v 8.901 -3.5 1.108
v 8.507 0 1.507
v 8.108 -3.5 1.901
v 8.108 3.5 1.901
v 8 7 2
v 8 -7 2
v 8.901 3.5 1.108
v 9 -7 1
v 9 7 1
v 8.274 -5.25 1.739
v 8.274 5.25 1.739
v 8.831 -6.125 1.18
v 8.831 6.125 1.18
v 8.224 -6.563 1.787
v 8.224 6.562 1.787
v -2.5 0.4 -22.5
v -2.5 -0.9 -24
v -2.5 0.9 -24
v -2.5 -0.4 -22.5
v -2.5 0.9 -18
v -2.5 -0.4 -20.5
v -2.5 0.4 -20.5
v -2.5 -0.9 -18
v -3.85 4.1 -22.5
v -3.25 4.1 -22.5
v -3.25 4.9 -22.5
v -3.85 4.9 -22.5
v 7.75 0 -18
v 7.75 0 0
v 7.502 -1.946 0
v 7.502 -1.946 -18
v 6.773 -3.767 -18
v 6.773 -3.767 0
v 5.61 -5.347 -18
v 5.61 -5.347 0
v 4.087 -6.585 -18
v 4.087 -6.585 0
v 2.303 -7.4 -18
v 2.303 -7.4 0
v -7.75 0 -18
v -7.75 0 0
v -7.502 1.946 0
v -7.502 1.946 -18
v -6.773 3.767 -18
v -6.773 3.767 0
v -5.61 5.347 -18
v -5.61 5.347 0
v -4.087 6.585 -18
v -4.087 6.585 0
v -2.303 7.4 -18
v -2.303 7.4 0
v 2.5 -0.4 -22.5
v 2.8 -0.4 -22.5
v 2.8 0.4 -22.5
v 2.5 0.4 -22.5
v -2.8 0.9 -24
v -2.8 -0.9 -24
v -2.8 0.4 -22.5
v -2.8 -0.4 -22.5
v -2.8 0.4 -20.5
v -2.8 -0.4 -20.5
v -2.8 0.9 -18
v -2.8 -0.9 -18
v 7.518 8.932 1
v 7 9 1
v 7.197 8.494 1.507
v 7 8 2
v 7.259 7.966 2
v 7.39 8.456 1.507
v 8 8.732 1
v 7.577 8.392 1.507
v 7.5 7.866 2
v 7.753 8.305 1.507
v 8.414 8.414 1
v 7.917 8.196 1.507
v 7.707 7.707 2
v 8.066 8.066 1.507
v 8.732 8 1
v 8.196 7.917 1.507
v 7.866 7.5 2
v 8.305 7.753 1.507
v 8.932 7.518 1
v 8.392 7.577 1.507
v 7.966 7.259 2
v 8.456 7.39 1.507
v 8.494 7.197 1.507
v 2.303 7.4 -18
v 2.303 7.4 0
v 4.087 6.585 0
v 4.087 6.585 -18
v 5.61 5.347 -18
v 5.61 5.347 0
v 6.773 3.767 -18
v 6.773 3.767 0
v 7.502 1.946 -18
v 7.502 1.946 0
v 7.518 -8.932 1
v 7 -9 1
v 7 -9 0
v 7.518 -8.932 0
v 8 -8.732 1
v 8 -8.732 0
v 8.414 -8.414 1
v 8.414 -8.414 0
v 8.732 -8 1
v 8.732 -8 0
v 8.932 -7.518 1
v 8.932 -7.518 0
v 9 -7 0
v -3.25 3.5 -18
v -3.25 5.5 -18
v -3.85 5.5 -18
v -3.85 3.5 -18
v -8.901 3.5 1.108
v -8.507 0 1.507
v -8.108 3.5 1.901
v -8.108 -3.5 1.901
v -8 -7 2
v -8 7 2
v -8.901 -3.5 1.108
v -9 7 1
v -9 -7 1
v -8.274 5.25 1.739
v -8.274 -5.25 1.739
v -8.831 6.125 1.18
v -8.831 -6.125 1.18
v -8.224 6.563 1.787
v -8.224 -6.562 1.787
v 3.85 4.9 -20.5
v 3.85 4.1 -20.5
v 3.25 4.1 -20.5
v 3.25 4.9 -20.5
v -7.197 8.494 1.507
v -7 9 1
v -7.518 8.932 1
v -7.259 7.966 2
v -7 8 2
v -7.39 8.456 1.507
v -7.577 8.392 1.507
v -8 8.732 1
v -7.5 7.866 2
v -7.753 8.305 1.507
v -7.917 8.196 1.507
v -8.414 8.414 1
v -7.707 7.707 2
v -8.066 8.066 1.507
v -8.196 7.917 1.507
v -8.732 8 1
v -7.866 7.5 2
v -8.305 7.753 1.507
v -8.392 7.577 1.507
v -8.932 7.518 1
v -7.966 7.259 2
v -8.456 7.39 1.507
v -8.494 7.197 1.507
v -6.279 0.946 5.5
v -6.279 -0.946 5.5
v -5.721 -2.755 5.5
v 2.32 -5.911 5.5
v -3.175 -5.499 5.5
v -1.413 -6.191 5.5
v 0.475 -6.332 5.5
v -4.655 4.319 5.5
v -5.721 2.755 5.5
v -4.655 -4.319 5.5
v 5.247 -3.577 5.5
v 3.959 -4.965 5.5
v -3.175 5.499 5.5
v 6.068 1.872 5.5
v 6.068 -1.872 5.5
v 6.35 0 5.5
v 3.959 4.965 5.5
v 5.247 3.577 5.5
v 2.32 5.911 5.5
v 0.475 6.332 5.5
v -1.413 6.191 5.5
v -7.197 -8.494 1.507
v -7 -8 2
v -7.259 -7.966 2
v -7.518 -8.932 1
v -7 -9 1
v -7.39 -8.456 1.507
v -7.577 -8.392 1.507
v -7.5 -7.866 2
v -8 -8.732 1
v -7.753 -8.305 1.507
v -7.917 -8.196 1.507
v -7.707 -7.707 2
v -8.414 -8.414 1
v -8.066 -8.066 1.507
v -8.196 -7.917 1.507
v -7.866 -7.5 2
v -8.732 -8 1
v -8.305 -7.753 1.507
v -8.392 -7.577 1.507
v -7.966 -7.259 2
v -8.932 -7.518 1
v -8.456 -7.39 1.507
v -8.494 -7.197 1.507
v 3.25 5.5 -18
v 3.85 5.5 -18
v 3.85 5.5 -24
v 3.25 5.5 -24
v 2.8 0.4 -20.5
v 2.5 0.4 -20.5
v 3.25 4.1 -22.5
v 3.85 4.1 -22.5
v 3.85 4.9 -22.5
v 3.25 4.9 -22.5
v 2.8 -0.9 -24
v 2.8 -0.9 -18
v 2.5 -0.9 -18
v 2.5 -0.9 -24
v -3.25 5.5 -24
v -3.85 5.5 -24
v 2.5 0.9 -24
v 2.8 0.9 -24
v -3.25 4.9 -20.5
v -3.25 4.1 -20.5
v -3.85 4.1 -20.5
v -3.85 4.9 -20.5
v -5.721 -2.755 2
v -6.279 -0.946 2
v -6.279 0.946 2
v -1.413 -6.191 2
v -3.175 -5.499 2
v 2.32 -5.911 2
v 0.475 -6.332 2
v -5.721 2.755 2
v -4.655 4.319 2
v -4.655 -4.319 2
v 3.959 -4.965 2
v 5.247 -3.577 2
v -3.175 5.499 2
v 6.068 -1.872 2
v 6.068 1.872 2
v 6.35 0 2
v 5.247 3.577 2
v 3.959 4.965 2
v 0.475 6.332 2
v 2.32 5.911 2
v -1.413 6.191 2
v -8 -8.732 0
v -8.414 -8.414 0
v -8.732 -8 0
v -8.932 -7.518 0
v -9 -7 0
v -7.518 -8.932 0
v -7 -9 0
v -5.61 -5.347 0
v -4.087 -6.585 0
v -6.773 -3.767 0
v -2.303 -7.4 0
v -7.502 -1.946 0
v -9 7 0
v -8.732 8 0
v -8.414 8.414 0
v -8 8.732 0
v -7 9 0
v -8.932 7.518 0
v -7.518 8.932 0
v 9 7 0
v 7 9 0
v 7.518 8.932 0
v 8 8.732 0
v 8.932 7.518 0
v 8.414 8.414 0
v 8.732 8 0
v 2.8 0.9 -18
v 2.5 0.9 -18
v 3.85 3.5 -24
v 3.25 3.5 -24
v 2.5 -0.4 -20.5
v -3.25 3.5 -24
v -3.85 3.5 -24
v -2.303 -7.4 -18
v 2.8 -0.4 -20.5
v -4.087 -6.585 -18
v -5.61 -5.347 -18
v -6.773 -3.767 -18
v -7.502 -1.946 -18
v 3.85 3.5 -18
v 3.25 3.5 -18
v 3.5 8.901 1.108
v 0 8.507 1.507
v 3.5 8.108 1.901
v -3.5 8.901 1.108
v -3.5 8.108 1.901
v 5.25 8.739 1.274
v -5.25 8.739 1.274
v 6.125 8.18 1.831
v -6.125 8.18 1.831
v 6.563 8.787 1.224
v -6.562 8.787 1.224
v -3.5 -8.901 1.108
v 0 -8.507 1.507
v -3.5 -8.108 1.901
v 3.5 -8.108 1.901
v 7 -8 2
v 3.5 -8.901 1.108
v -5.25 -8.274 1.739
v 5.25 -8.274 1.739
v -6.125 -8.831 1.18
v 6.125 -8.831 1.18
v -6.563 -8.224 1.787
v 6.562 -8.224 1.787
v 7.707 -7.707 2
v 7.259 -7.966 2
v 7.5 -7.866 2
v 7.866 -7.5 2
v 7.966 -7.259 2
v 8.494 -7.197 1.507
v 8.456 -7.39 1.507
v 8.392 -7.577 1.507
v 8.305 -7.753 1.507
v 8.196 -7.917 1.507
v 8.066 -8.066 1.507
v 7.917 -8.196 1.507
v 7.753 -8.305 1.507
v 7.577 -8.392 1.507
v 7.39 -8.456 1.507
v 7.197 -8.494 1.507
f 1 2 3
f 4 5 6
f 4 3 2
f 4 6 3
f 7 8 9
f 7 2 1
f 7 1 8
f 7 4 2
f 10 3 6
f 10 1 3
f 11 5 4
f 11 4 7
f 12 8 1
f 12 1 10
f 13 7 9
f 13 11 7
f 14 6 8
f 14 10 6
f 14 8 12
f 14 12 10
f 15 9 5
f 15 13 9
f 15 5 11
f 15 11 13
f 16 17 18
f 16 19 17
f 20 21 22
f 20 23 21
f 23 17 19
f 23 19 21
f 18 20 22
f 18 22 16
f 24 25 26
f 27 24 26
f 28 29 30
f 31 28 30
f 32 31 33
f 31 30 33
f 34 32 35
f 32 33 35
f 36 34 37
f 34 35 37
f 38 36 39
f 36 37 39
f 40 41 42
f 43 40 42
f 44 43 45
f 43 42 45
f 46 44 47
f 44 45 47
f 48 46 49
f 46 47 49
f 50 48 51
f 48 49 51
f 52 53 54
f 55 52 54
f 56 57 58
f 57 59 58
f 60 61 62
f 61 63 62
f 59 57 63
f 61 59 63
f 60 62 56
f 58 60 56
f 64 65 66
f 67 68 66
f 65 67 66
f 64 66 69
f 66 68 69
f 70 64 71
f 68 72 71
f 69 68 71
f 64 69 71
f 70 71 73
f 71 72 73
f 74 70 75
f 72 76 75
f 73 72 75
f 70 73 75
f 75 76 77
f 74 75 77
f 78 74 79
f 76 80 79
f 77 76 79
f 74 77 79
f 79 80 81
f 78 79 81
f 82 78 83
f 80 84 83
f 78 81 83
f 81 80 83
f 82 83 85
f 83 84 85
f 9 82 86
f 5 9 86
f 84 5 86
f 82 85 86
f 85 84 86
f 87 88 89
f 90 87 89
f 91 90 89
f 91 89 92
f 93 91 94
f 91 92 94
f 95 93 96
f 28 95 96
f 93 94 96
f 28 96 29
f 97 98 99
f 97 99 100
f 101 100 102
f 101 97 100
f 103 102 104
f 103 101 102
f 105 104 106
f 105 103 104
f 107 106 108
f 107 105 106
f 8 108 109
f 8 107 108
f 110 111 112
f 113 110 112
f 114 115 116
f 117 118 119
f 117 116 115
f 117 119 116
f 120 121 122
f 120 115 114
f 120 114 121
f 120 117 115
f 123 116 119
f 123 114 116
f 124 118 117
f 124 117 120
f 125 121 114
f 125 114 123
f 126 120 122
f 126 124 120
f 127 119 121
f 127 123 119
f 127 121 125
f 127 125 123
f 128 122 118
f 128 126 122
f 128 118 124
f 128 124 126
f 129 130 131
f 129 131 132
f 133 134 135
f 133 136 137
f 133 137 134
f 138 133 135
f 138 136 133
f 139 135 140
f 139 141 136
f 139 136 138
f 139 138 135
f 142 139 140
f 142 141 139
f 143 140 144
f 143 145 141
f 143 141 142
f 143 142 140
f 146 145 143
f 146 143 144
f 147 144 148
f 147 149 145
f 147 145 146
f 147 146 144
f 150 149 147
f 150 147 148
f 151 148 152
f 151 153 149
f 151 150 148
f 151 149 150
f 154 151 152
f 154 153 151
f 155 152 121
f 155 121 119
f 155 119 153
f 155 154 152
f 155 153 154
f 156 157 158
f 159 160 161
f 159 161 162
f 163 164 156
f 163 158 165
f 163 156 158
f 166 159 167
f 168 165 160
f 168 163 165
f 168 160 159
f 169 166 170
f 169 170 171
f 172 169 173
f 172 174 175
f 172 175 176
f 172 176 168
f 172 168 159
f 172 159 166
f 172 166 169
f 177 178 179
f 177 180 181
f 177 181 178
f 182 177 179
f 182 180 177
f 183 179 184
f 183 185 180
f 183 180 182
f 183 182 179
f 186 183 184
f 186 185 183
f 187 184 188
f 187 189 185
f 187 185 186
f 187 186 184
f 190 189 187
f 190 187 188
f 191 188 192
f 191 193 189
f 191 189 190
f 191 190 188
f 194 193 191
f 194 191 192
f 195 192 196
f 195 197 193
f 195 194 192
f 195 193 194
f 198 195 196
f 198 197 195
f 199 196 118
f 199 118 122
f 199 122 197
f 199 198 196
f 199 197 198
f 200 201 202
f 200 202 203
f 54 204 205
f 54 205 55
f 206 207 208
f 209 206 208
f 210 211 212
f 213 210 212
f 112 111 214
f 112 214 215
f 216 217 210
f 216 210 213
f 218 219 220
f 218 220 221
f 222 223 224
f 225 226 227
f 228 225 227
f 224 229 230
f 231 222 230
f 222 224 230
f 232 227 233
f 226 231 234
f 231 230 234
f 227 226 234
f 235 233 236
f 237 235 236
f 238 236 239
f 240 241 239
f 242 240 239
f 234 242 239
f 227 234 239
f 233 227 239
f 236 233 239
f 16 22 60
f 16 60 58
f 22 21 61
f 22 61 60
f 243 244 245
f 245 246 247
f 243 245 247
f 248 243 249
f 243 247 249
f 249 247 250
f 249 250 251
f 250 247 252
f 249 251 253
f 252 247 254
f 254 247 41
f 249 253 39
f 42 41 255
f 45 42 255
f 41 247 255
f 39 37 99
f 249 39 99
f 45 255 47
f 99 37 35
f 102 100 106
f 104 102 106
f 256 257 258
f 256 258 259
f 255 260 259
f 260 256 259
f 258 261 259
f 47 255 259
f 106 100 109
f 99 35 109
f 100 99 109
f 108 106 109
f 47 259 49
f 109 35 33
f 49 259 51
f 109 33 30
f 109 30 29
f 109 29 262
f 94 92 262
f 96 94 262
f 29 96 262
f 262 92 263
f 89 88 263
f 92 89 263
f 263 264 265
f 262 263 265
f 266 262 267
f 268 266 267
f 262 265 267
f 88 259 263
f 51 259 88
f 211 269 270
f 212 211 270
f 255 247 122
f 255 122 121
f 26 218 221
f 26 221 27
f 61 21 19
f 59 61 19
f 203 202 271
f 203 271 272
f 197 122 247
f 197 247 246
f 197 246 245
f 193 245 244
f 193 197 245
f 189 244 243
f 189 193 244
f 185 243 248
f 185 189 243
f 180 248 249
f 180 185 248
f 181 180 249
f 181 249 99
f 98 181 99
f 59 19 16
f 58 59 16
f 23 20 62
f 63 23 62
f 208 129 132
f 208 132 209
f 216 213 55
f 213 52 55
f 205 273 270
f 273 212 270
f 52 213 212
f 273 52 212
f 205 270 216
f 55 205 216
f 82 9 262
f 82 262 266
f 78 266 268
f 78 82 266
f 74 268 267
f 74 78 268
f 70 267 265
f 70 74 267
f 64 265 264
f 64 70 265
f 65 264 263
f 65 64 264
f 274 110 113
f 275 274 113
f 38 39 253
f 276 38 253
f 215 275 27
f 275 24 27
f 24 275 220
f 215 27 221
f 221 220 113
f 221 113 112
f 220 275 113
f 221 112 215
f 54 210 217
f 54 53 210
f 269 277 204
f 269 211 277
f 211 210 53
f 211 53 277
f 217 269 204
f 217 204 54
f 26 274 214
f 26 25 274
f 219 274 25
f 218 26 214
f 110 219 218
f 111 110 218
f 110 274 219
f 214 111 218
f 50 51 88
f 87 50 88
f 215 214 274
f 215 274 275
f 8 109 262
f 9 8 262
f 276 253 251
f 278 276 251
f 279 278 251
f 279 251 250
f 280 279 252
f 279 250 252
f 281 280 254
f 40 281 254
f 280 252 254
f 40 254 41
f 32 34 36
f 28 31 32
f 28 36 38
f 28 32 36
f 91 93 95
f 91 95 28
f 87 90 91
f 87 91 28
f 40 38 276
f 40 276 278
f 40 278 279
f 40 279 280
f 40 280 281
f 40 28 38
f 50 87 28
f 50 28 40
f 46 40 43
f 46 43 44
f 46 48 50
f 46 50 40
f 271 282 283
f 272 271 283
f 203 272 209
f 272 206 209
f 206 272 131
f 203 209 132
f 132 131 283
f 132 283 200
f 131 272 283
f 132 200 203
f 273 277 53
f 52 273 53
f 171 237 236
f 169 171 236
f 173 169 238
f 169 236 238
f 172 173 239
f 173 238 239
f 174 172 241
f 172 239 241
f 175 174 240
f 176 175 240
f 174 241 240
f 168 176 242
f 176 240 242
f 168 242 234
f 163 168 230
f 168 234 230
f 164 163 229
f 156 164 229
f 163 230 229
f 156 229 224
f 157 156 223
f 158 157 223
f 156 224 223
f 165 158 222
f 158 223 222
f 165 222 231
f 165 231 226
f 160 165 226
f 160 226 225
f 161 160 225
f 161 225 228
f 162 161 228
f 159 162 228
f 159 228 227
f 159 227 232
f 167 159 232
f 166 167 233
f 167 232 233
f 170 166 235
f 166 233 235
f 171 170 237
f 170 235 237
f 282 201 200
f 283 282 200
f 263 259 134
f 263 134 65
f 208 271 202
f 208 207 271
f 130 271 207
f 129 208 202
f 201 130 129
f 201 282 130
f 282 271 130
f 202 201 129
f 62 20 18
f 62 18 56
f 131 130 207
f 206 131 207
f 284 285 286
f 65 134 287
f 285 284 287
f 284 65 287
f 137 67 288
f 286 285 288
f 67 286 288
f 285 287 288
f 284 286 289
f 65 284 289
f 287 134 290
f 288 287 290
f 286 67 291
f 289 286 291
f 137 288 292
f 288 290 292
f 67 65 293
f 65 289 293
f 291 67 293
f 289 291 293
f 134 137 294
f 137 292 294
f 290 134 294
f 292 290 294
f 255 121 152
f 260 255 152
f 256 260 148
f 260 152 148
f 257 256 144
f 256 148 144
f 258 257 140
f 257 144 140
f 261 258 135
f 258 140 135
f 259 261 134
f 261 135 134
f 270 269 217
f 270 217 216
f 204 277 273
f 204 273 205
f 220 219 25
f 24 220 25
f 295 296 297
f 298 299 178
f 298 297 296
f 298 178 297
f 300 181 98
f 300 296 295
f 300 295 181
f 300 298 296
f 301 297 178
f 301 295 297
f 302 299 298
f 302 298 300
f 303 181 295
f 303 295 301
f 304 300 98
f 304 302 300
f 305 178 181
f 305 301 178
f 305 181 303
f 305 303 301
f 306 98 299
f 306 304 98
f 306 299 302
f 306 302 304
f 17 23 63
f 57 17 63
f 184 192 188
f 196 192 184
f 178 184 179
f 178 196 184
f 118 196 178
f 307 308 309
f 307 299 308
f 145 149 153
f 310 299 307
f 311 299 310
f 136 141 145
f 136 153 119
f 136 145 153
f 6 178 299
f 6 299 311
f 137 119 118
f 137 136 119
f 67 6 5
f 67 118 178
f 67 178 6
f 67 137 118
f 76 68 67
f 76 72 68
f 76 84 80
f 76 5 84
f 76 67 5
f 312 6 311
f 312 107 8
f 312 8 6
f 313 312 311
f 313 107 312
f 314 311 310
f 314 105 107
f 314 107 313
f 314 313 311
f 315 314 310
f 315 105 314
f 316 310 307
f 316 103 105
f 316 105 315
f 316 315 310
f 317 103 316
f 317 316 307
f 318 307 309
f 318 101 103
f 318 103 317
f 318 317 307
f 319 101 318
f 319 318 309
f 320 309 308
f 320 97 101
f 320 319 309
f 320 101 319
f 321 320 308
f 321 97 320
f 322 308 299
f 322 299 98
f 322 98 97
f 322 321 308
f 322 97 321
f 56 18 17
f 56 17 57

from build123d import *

# Parameters (mm, degrees)
SKETCH1_W             = 18
SKETCH1_H             = 18
BOSS_EXTRUDE1_DEPTH   = 2
FILLET1_R             = 2
FILLET2_SIZE          = 1
SKETCH2_R             = 6.35
BOSS_EXTRUDE2_DEPTH   = 3.5
BOSS_EXTRUDE3_DEPTH   = 18
SKETCH4_W             = 0.6
SKETCH4_H             = 2
BOSS_EXTRUDE4_DEPTH   = 6
SKETCH4_W_2           = 0.3
SKETCH4_H_2           = 1.8
BOSS_EXTRUDE4_2_DEPTH = 6
BOSS_EXTRUDE4_3_DEPTH = 6
BOSS_EXTRUDE4_4_DEPTH = 6
SKETCH5_W             = 2
SKETCH5_H             = 0.8
CUT_EXTRUDE1_DEPTH    = 29.672678709


with BuildPart() as part:
    # Sketch1 → Boss-Extrude1 (new body)
    with BuildSketch(Plane.XY):
        Rectangle(SKETCH1_W, SKETCH1_H)
    extrude(amount=BOSS_EXTRUDE1_DEPTH)

    # Fillet1
    fillet1_edges = [part.edges().sort_by_distance(p)[0] for p in [
        (9, -9, 1),
        (-9, -9, 1),
        (-9, 9, 1),
        (9, 9, 1),
    ]]
    fillet(fillet1_edges, radius=FILLET1_R)

    # Fillet2
    # a fillet whose section is not a circle: 1 mm, written as the material it takes off along each edge
    with BuildSketch(Plane(origin=(-7, 7, 2), x_dir=(0, 1, 0), z_dir=(1, 0, 0))) as fillet2_piece_1:
        with BuildLine():
            Bezier((2, -FILLET2_SIZE), (2, 0), (2 - FILLET2_SIZE, 0), weights=[1, 0.014142136, 1])
            Line((2 - FILLET2_SIZE, 0), (2, 0))
            Line((2, 0), (2, -FILLET2_SIZE))
        make_face()
    revolve(axis=Axis((-7, 7, 2), (0, 0, 1)), revolution_arc=90, mode=Mode.SUBTRACT)
    with BuildSketch(Plane(origin=(-7, 9, 2), x_dir=(0, 0, -1), z_dir=(1, 0, 0))) as fillet2_piece_2:
        with BuildLine():
            Bezier((FILLET2_SIZE, 0), (0, 0), (0, -FILLET2_SIZE), weights=[1, 0.014142136, 1])
            Line((0, -FILLET2_SIZE), (0, 0))
            Line((0, 0), (FILLET2_SIZE, 0))
        make_face()
    extrude(amount=14, mode=Mode.SUBTRACT)
    with BuildSketch(Plane(origin=(7, 7, 2), x_dir=(0, 1, 0), z_dir=(-1, 0, 0))) as fillet2_piece_3:
        with BuildLine():
            Bezier((2, FILLET2_SIZE), (2, 0), (2 - FILLET2_SIZE, 0), weights=[1, 0.014142136, 1])
            Line((2 - FILLET2_SIZE, 0), (2, 0))
            Line((2, 0), (2, FILLET2_SIZE))
        make_face()
    revolve(axis=Axis((7, 7, 2), (0, 0, -1)), revolution_arc=90, mode=Mode.SUBTRACT)
    with BuildSketch(Plane(origin=(9, 7, 2), x_dir=(-1, 0, 0), z_dir=(0, -1, 0)), Plane(origin=(7, -9, 2), x_dir=(0, 1, 0), z_dir=(-1, 0, 0)), Plane(origin=(-9, -7, 2), x_dir=(1, 0, 0), z_dir=(0, 1, 0))) as fillet2_piece_4:
        with BuildLine():
            Bezier((FILLET2_SIZE, 0), (0, 0), (0, FILLET2_SIZE), weights=[1, 0.014142136, 1])
            Line((0, FILLET2_SIZE), (0, 0))
            Line((0, 0), (FILLET2_SIZE, 0))
        make_face()
    extrude(amount=14, mode=Mode.SUBTRACT)
    with BuildSketch(Plane(origin=(7, -7, 2), x_dir=(1, 0, 0), z_dir=(0, 1, 0))) as fillet2_piece_5:
        with BuildLine():
            Bezier((2 - FILLET2_SIZE, 0), (2, 0), (2, FILLET2_SIZE), weights=[1, 0.014142136, 1])
            Line((2, FILLET2_SIZE), (2, 0))
            Line((2, 0), (2 - FILLET2_SIZE, 0))
        make_face()
    revolve(axis=Axis((7, -7, 2), (0, 0, -1)), revolution_arc=90, mode=Mode.SUBTRACT)
    with BuildSketch(Plane(origin=(-7, -7, 2), x_dir=(0, -1, 0), z_dir=(1, 0, 0))) as fillet2_piece_6:
        with BuildLine():
            Bezier((2 - FILLET2_SIZE, 0), (2, 0), (2, FILLET2_SIZE), weights=[1, 0.014142136, 1])
            Line((2, FILLET2_SIZE), (2, 0))
            Line((2, 0), (2 - FILLET2_SIZE, 0))
        make_face()
    revolve(axis=Axis((-7, -7, 2), (0, 0, -1)), revolution_arc=90, mode=Mode.SUBTRACT)

    # Sketch3 → Boss-Extrude3 (add)
    with BuildSketch(Plane(origin=(0, 0, 0), x_dir=(-1, 0, 0), z_dir=(0, 0, -1))):
        with BuildLine():
            ThreePointArc((-2.302715788, 7.4), (-6.241335889, 4.59436898), (-7.75, 0))
            Line((-7.75, 0), (7.75, 0))
            ThreePointArc((7.75, 0), (6.241335889, 4.59436898), (2.302715788, 7.4))
            Line((2.302715788, 7.4), (-2.302715788, 7.4))
        make_face()
        with BuildLine():
            Line((7.75, 0), (-7.75, 0))
            ThreePointArc((-7.75, 0), (-6.241335889, -4.59436898), (-2.302715788, -7.4))
            Line((-2.302715788, -7.4), (2.302715788, -7.4))
            ThreePointArc((2.302715788, -7.4), (6.241335889, -4.59436898), (7.75, 0))
        make_face()
    extrude(amount=BOSS_EXTRUDE3_DEPTH)


with BuildPart() as body_2:
    # Sketch2 → Boss-Extrude2 (new body)
    with BuildSketch(Plane.XY.offset(2)):
        Circle(SKETCH2_R)
    extrude(amount=BOSS_EXTRUDE2_DEPTH)


with BuildPart() as body_3:
    # Sketch4 → Boss-Extrude4 (new body)
    with BuildSketch(Plane(origin=(0, 0, -18), x_dir=(-1, 0, 0), z_dir=(0, 0, -1))):
        with Locations((-3.55, 4.5)):
            Rectangle(SKETCH4_W, SKETCH4_H)
    extrude(amount=BOSS_EXTRUDE4_DEPTH)


with BuildPart() as body_4:
    # Sketch4 → Boss-Extrude4 2 (new body)
    with BuildSketch(Plane(origin=(0, 0, -18), x_dir=(-1, 0, 0), z_dir=(0, 0, -1))):
        with Locations((-2.65, 0)):
            Rectangle(SKETCH4_W_2, SKETCH4_H_2)
    extrude(amount=BOSS_EXTRUDE4_2_DEPTH)


with BuildPart() as body_5:
    # Sketch4 → Boss-Extrude4 3 (new body)
    with BuildSketch(Plane(origin=(0, 0, -18), x_dir=(-1, 0, 0), z_dir=(0, 0, -1))):
        with Locations((2.65, 0)):
            Rectangle(SKETCH4_W_2, SKETCH4_H_2)
    extrude(amount=BOSS_EXTRUDE4_3_DEPTH)


with BuildPart() as body_6:
    # Sketch4 → Boss-Extrude4 4 (new body)
    with BuildSketch(Plane(origin=(0, 0, -18), x_dir=(-1, 0, 0), z_dir=(0, 0, -1))):
        with Locations((3.55, 4.5)):
            Rectangle(SKETCH4_W, SKETCH4_H)
    extrude(amount=BOSS_EXTRUDE4_4_DEPTH)


with BuildPart() as cut_extrude1_tool:
    # Sketch5 → Cut-Extrude1 (new, through all)
    with BuildSketch(Plane(origin=(3.85, 0, 0), x_dir=(0, 0, -1), z_dir=(1, 0, 0))):
        with Locations((21.5, 4.5)):
            Rectangle(SKETCH5_W, SKETCH5_H)
        with Locations((21.5, 0)):
            Rectangle(SKETCH5_W, SKETCH5_H)
    extrude(amount=-CUT_EXTRUDE1_DEPTH)


with BuildPart() as body_3_1:
    add(body_3.part)

    # Cut-Extrude1: cut by cut_extrude1_tool
    add(cut_extrude1_tool.part, mode=Mode.SUBTRACT)


with BuildPart() as body_4_1:
    add(body_4.part)

    # Cut-Extrude1: cut by cut_extrude1_tool
    add(cut_extrude1_tool.part, mode=Mode.SUBTRACT)


with BuildPart() as body_5_1:
    add(body_5.part)

    # Cut-Extrude1: cut by cut_extrude1_tool
    add(cut_extrude1_tool.part, mode=Mode.SUBTRACT)


with BuildPart() as body_6_1:
    add(body_6.part)

    # Cut-Extrude1: cut by cut_extrude1_tool
    add(cut_extrude1_tool.part, mode=Mode.SUBTRACT)


solid = Compound([part.part, body_2.part, body_3_1.part, body_4_1.part, body_5_1.part, body_6_1.part])
